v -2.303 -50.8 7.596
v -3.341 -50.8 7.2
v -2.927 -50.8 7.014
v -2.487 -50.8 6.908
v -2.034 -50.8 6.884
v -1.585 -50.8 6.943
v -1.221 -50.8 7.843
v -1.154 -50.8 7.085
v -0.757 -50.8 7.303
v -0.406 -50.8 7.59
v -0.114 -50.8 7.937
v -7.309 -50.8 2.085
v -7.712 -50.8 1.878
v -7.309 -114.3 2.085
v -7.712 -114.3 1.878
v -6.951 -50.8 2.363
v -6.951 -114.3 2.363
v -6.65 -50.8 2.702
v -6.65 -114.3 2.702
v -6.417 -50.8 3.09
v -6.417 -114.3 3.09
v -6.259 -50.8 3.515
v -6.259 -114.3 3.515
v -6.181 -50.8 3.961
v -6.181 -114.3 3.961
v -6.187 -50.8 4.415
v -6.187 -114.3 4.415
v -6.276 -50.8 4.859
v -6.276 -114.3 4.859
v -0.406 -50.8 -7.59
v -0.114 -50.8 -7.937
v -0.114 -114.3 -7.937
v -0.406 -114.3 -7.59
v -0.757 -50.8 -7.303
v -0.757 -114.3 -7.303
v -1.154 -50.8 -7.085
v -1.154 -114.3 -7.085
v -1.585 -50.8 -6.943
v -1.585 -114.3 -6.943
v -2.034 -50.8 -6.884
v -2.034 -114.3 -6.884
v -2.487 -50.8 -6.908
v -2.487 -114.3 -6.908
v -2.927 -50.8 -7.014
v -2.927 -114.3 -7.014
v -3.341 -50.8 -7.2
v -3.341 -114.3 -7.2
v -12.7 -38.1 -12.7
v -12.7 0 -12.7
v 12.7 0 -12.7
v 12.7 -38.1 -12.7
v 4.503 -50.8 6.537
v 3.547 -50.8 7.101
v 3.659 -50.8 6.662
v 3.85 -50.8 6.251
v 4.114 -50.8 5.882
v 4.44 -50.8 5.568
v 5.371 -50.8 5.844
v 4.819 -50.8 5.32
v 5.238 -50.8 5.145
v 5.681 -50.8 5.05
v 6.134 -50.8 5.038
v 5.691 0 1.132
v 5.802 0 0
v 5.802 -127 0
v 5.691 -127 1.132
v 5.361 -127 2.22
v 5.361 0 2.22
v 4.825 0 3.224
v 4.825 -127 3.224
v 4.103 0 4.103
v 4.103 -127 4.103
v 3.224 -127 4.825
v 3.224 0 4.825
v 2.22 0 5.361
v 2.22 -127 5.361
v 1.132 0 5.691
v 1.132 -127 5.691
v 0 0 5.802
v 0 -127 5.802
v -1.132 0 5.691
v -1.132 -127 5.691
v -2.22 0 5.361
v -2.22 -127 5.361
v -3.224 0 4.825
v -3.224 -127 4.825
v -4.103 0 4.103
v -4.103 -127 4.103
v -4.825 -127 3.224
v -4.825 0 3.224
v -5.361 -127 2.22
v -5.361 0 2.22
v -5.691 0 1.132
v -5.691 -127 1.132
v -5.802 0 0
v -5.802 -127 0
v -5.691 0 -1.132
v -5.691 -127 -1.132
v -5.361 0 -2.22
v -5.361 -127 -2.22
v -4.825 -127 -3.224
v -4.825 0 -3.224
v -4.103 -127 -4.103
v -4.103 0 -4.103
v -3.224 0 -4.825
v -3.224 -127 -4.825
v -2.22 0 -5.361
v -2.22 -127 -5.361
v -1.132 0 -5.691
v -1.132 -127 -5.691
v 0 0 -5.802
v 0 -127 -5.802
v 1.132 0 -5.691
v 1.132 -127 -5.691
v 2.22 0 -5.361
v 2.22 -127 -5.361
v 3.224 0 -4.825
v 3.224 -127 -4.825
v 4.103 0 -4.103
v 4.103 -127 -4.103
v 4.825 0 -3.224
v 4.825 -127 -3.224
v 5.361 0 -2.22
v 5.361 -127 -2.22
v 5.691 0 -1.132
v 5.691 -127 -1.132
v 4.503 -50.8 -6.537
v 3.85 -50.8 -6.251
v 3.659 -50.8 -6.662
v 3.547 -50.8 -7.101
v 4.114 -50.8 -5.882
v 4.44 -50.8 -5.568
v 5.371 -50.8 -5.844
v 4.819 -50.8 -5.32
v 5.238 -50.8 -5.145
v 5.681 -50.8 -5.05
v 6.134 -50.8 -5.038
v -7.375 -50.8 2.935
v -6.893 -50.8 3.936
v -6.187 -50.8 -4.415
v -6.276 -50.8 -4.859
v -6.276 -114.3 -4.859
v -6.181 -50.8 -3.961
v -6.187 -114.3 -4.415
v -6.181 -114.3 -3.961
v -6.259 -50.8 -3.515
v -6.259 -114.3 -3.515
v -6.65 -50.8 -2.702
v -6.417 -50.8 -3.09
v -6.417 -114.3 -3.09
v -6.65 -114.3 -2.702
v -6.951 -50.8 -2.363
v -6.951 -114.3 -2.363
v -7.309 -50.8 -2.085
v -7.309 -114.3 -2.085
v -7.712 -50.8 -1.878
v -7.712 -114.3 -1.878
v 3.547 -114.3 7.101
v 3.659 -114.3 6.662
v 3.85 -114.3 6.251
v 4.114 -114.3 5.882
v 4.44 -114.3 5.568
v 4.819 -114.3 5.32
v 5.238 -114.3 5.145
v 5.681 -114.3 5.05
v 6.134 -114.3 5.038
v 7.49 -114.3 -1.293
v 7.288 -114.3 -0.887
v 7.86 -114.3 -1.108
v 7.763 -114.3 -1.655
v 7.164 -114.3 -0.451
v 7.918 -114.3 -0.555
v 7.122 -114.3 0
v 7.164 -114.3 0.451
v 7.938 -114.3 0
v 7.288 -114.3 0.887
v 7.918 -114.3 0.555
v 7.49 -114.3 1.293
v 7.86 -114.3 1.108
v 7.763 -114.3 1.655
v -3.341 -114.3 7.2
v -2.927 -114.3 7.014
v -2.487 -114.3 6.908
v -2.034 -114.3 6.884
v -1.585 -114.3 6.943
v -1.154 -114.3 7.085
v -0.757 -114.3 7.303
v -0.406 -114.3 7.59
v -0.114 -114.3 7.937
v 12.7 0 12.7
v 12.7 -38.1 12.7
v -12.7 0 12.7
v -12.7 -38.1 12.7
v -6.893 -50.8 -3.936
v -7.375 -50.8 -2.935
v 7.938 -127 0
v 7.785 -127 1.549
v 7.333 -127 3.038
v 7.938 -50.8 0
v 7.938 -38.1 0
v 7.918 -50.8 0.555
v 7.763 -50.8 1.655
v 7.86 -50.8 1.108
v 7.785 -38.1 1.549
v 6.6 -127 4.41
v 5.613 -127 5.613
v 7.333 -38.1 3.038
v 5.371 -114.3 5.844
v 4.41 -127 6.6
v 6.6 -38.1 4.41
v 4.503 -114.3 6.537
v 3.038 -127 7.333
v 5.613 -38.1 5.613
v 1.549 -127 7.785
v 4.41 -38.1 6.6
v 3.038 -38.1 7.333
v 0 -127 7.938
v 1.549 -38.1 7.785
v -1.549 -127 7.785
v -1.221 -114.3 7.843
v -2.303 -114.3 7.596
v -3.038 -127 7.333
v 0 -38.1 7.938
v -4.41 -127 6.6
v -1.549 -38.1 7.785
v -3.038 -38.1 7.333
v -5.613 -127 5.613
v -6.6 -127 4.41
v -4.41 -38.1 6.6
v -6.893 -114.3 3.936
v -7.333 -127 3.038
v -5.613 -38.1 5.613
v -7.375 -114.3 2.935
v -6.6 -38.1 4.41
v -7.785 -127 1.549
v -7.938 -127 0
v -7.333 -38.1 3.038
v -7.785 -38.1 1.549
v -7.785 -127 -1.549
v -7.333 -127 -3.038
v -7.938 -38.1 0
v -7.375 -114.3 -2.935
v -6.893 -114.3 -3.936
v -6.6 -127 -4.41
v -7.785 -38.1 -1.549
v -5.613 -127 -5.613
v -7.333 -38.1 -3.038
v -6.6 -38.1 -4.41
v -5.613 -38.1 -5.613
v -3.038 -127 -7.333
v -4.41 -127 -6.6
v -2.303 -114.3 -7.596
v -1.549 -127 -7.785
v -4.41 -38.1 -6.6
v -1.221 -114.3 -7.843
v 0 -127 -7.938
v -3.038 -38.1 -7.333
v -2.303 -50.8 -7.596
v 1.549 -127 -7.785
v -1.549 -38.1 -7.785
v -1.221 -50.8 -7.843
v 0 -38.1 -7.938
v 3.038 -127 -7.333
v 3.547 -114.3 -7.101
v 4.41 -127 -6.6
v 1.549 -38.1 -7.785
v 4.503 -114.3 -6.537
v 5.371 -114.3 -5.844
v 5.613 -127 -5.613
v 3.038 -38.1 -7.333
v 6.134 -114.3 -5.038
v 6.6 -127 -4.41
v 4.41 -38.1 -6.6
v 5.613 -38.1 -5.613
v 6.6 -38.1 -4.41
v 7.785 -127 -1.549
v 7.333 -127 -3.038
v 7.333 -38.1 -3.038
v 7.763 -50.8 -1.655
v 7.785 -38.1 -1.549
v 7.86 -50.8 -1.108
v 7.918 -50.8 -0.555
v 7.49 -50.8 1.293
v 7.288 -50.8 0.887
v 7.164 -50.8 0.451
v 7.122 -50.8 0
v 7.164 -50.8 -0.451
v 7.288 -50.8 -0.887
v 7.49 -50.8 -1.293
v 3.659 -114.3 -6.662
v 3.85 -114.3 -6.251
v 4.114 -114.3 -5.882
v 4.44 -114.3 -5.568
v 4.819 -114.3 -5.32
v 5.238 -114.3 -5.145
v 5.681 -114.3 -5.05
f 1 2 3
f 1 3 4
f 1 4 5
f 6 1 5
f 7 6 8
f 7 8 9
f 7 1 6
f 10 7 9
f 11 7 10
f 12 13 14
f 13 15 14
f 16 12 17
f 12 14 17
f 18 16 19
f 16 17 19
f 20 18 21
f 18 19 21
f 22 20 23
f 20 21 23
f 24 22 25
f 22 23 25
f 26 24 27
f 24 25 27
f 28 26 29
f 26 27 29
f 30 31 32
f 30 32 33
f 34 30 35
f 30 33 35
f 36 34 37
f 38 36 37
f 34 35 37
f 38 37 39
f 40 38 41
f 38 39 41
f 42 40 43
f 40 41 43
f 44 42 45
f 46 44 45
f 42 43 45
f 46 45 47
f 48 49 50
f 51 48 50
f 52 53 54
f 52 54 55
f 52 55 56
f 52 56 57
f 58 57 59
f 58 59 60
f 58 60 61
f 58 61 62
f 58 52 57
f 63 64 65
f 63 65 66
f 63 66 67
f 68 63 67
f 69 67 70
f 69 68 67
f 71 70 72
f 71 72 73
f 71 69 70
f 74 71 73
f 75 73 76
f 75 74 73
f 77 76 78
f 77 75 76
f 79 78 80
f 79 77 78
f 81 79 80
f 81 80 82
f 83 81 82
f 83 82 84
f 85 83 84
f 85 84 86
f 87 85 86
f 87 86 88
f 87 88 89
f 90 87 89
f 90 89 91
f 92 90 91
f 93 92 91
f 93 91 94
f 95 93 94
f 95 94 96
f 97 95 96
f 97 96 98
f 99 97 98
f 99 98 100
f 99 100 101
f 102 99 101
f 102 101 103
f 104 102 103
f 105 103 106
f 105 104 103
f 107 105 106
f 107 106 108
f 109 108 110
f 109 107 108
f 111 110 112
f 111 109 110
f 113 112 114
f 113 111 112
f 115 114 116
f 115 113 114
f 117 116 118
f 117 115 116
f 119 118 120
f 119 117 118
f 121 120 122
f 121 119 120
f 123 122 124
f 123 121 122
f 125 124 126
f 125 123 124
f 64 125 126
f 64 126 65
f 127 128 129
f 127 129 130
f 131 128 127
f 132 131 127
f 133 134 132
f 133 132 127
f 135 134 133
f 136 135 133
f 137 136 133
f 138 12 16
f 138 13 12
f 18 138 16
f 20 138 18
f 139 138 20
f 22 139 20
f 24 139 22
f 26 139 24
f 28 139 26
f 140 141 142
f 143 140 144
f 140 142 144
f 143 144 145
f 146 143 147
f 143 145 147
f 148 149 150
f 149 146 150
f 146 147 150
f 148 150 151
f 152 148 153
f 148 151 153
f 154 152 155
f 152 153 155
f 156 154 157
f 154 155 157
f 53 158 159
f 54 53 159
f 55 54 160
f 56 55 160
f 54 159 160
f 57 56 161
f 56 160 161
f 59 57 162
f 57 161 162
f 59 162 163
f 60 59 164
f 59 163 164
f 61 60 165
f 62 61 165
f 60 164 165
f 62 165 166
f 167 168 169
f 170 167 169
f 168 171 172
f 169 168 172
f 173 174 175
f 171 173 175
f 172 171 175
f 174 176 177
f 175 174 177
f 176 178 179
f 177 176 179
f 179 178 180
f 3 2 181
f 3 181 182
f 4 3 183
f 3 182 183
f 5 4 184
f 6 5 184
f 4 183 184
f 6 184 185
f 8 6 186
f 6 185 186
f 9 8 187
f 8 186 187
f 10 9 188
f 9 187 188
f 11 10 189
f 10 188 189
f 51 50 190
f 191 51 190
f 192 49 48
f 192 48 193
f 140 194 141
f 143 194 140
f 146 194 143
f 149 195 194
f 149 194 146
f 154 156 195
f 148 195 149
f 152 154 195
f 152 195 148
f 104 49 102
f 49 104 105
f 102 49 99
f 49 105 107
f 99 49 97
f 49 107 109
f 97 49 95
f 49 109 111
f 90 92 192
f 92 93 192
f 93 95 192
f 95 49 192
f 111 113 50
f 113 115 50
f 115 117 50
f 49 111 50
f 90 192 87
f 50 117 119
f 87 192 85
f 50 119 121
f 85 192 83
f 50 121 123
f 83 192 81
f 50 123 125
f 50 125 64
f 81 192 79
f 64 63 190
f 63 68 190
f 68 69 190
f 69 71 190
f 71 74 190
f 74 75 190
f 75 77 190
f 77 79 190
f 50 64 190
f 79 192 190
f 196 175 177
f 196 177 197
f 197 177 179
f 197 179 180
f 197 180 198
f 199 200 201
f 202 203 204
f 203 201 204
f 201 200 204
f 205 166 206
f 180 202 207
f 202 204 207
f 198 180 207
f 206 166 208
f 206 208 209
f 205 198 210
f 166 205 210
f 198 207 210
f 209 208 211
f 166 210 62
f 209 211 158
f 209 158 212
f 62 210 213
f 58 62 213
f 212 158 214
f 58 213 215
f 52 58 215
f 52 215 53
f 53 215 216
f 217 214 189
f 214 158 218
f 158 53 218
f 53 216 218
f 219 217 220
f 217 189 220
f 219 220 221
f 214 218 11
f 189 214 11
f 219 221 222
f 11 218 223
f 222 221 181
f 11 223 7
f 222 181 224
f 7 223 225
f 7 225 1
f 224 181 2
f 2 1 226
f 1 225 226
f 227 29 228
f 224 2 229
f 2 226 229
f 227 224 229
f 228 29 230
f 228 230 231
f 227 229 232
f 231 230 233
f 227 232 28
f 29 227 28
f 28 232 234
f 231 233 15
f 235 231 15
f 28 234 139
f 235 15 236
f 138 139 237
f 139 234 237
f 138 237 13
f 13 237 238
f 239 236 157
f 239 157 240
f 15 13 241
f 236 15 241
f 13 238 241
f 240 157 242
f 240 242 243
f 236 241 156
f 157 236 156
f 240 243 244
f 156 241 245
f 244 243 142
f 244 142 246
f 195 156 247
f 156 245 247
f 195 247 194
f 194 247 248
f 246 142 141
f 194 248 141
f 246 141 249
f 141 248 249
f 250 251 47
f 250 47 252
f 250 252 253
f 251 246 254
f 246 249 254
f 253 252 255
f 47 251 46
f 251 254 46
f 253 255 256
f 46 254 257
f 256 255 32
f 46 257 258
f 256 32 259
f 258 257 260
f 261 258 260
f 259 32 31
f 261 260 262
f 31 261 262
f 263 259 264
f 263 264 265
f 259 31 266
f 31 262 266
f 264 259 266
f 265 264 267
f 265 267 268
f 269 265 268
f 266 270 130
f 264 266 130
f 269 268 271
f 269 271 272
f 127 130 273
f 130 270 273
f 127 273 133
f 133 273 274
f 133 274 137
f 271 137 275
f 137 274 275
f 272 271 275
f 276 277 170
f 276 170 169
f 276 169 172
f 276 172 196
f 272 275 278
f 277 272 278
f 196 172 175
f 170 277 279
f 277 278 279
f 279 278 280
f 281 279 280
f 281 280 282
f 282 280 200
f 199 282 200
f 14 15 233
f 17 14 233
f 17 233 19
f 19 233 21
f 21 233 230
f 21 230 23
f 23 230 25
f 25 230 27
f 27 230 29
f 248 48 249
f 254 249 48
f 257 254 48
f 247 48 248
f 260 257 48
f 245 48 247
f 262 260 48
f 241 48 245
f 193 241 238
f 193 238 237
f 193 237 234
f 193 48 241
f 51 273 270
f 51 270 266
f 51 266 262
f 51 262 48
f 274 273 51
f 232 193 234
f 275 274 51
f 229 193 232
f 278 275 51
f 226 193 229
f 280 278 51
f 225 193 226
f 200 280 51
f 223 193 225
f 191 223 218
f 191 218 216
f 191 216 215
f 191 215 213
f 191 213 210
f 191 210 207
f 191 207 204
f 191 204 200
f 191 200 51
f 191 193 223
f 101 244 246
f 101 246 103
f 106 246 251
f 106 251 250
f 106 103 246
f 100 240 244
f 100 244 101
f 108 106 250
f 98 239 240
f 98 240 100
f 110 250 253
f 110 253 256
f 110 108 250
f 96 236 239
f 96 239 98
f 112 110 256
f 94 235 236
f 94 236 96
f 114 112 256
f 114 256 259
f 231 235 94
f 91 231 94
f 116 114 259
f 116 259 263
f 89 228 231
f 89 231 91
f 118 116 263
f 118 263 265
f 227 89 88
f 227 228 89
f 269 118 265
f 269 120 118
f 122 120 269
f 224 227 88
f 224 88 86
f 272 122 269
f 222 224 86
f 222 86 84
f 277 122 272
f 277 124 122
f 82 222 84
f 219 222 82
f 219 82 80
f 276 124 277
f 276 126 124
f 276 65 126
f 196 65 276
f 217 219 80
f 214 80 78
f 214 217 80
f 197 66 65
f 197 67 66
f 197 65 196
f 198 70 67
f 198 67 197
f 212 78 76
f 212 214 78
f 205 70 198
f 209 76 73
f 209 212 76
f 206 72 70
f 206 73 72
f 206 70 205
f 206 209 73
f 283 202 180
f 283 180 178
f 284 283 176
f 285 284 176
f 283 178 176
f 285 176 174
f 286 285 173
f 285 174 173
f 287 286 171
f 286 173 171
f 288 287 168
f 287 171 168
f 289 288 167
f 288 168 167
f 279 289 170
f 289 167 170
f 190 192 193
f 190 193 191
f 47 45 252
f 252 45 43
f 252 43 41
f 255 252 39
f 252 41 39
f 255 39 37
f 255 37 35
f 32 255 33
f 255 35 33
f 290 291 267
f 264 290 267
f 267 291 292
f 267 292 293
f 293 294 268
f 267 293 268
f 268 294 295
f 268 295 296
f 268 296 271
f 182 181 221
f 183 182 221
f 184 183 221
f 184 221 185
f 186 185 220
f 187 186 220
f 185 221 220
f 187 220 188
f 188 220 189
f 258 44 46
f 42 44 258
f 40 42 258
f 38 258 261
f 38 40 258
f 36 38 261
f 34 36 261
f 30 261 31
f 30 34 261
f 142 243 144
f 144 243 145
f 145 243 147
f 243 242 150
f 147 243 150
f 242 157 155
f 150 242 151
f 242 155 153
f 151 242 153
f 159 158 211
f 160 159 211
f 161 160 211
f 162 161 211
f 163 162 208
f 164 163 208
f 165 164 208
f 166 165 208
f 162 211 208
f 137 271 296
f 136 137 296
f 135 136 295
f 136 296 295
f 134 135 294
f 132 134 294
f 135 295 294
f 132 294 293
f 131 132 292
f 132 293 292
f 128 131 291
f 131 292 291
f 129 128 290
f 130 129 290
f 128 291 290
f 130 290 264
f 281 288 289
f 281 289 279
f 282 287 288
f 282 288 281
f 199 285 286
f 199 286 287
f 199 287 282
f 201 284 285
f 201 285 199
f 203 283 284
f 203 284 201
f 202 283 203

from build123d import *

# Parameters (mm, degrees)
F0_W     = 25.4
F0_H     = 25.4
F0_R     = 7.9375
F0_R_2   = 5.8024107256
F1_DEPTH = 38.1
F2_DEPTH = 127
F4_START = -12.7
F3_R     = 2.4554456834
F4_DEPTH = 63.5


with BuildPart() as f1:
    # F0 (on Front) → F1 (new body)
    with BuildSketch(Plane.XZ):
        Rectangle(F0_W, F0_H)
        Circle(F0_R, mode=Mode.SUBTRACT)
        Circle(F0_R)
        Circle(F0_R_2, mode=Mode.SUBTRACT)
    extrude(amount=F1_DEPTH)

    # F0 (on Front) → F2 (join)
    with BuildSketch(Plane.XZ):
        Circle(F0_R)
        Circle(F0_R_2, mode=Mode.SUBTRACT)
    extrude(amount=F2_DEPTH)

    # F3 (on face) → F4 (cut)
    with BuildSketch(Plane.XZ.offset(127).offset(F4_START)):
        with Locations((9.5774363726, 0)):
            Circle(F3_R)
        with Locations((5.9714339063, 7.4879412775)):
            Circle(F3_R)
        with Locations((-2.1311800865, 9.3373100468)):
            Circle(F3_R)
        with Locations((-8.6289720061, 4.1554939045)):
            Circle(F3_R)
        with Locations((-8.6289720061, -4.1554939045)):
            Circle(F3_R)
        with Locations((-2.1311800865, -9.3373100468)):
            Circle(F3_R)
        with Locations((5.9714339063, -7.4879412775)):
            Circle(F3_R)
    extrude(amount=-F4_DEPTH, mode=Mode.SUBTRACT)


solid = f1.part
